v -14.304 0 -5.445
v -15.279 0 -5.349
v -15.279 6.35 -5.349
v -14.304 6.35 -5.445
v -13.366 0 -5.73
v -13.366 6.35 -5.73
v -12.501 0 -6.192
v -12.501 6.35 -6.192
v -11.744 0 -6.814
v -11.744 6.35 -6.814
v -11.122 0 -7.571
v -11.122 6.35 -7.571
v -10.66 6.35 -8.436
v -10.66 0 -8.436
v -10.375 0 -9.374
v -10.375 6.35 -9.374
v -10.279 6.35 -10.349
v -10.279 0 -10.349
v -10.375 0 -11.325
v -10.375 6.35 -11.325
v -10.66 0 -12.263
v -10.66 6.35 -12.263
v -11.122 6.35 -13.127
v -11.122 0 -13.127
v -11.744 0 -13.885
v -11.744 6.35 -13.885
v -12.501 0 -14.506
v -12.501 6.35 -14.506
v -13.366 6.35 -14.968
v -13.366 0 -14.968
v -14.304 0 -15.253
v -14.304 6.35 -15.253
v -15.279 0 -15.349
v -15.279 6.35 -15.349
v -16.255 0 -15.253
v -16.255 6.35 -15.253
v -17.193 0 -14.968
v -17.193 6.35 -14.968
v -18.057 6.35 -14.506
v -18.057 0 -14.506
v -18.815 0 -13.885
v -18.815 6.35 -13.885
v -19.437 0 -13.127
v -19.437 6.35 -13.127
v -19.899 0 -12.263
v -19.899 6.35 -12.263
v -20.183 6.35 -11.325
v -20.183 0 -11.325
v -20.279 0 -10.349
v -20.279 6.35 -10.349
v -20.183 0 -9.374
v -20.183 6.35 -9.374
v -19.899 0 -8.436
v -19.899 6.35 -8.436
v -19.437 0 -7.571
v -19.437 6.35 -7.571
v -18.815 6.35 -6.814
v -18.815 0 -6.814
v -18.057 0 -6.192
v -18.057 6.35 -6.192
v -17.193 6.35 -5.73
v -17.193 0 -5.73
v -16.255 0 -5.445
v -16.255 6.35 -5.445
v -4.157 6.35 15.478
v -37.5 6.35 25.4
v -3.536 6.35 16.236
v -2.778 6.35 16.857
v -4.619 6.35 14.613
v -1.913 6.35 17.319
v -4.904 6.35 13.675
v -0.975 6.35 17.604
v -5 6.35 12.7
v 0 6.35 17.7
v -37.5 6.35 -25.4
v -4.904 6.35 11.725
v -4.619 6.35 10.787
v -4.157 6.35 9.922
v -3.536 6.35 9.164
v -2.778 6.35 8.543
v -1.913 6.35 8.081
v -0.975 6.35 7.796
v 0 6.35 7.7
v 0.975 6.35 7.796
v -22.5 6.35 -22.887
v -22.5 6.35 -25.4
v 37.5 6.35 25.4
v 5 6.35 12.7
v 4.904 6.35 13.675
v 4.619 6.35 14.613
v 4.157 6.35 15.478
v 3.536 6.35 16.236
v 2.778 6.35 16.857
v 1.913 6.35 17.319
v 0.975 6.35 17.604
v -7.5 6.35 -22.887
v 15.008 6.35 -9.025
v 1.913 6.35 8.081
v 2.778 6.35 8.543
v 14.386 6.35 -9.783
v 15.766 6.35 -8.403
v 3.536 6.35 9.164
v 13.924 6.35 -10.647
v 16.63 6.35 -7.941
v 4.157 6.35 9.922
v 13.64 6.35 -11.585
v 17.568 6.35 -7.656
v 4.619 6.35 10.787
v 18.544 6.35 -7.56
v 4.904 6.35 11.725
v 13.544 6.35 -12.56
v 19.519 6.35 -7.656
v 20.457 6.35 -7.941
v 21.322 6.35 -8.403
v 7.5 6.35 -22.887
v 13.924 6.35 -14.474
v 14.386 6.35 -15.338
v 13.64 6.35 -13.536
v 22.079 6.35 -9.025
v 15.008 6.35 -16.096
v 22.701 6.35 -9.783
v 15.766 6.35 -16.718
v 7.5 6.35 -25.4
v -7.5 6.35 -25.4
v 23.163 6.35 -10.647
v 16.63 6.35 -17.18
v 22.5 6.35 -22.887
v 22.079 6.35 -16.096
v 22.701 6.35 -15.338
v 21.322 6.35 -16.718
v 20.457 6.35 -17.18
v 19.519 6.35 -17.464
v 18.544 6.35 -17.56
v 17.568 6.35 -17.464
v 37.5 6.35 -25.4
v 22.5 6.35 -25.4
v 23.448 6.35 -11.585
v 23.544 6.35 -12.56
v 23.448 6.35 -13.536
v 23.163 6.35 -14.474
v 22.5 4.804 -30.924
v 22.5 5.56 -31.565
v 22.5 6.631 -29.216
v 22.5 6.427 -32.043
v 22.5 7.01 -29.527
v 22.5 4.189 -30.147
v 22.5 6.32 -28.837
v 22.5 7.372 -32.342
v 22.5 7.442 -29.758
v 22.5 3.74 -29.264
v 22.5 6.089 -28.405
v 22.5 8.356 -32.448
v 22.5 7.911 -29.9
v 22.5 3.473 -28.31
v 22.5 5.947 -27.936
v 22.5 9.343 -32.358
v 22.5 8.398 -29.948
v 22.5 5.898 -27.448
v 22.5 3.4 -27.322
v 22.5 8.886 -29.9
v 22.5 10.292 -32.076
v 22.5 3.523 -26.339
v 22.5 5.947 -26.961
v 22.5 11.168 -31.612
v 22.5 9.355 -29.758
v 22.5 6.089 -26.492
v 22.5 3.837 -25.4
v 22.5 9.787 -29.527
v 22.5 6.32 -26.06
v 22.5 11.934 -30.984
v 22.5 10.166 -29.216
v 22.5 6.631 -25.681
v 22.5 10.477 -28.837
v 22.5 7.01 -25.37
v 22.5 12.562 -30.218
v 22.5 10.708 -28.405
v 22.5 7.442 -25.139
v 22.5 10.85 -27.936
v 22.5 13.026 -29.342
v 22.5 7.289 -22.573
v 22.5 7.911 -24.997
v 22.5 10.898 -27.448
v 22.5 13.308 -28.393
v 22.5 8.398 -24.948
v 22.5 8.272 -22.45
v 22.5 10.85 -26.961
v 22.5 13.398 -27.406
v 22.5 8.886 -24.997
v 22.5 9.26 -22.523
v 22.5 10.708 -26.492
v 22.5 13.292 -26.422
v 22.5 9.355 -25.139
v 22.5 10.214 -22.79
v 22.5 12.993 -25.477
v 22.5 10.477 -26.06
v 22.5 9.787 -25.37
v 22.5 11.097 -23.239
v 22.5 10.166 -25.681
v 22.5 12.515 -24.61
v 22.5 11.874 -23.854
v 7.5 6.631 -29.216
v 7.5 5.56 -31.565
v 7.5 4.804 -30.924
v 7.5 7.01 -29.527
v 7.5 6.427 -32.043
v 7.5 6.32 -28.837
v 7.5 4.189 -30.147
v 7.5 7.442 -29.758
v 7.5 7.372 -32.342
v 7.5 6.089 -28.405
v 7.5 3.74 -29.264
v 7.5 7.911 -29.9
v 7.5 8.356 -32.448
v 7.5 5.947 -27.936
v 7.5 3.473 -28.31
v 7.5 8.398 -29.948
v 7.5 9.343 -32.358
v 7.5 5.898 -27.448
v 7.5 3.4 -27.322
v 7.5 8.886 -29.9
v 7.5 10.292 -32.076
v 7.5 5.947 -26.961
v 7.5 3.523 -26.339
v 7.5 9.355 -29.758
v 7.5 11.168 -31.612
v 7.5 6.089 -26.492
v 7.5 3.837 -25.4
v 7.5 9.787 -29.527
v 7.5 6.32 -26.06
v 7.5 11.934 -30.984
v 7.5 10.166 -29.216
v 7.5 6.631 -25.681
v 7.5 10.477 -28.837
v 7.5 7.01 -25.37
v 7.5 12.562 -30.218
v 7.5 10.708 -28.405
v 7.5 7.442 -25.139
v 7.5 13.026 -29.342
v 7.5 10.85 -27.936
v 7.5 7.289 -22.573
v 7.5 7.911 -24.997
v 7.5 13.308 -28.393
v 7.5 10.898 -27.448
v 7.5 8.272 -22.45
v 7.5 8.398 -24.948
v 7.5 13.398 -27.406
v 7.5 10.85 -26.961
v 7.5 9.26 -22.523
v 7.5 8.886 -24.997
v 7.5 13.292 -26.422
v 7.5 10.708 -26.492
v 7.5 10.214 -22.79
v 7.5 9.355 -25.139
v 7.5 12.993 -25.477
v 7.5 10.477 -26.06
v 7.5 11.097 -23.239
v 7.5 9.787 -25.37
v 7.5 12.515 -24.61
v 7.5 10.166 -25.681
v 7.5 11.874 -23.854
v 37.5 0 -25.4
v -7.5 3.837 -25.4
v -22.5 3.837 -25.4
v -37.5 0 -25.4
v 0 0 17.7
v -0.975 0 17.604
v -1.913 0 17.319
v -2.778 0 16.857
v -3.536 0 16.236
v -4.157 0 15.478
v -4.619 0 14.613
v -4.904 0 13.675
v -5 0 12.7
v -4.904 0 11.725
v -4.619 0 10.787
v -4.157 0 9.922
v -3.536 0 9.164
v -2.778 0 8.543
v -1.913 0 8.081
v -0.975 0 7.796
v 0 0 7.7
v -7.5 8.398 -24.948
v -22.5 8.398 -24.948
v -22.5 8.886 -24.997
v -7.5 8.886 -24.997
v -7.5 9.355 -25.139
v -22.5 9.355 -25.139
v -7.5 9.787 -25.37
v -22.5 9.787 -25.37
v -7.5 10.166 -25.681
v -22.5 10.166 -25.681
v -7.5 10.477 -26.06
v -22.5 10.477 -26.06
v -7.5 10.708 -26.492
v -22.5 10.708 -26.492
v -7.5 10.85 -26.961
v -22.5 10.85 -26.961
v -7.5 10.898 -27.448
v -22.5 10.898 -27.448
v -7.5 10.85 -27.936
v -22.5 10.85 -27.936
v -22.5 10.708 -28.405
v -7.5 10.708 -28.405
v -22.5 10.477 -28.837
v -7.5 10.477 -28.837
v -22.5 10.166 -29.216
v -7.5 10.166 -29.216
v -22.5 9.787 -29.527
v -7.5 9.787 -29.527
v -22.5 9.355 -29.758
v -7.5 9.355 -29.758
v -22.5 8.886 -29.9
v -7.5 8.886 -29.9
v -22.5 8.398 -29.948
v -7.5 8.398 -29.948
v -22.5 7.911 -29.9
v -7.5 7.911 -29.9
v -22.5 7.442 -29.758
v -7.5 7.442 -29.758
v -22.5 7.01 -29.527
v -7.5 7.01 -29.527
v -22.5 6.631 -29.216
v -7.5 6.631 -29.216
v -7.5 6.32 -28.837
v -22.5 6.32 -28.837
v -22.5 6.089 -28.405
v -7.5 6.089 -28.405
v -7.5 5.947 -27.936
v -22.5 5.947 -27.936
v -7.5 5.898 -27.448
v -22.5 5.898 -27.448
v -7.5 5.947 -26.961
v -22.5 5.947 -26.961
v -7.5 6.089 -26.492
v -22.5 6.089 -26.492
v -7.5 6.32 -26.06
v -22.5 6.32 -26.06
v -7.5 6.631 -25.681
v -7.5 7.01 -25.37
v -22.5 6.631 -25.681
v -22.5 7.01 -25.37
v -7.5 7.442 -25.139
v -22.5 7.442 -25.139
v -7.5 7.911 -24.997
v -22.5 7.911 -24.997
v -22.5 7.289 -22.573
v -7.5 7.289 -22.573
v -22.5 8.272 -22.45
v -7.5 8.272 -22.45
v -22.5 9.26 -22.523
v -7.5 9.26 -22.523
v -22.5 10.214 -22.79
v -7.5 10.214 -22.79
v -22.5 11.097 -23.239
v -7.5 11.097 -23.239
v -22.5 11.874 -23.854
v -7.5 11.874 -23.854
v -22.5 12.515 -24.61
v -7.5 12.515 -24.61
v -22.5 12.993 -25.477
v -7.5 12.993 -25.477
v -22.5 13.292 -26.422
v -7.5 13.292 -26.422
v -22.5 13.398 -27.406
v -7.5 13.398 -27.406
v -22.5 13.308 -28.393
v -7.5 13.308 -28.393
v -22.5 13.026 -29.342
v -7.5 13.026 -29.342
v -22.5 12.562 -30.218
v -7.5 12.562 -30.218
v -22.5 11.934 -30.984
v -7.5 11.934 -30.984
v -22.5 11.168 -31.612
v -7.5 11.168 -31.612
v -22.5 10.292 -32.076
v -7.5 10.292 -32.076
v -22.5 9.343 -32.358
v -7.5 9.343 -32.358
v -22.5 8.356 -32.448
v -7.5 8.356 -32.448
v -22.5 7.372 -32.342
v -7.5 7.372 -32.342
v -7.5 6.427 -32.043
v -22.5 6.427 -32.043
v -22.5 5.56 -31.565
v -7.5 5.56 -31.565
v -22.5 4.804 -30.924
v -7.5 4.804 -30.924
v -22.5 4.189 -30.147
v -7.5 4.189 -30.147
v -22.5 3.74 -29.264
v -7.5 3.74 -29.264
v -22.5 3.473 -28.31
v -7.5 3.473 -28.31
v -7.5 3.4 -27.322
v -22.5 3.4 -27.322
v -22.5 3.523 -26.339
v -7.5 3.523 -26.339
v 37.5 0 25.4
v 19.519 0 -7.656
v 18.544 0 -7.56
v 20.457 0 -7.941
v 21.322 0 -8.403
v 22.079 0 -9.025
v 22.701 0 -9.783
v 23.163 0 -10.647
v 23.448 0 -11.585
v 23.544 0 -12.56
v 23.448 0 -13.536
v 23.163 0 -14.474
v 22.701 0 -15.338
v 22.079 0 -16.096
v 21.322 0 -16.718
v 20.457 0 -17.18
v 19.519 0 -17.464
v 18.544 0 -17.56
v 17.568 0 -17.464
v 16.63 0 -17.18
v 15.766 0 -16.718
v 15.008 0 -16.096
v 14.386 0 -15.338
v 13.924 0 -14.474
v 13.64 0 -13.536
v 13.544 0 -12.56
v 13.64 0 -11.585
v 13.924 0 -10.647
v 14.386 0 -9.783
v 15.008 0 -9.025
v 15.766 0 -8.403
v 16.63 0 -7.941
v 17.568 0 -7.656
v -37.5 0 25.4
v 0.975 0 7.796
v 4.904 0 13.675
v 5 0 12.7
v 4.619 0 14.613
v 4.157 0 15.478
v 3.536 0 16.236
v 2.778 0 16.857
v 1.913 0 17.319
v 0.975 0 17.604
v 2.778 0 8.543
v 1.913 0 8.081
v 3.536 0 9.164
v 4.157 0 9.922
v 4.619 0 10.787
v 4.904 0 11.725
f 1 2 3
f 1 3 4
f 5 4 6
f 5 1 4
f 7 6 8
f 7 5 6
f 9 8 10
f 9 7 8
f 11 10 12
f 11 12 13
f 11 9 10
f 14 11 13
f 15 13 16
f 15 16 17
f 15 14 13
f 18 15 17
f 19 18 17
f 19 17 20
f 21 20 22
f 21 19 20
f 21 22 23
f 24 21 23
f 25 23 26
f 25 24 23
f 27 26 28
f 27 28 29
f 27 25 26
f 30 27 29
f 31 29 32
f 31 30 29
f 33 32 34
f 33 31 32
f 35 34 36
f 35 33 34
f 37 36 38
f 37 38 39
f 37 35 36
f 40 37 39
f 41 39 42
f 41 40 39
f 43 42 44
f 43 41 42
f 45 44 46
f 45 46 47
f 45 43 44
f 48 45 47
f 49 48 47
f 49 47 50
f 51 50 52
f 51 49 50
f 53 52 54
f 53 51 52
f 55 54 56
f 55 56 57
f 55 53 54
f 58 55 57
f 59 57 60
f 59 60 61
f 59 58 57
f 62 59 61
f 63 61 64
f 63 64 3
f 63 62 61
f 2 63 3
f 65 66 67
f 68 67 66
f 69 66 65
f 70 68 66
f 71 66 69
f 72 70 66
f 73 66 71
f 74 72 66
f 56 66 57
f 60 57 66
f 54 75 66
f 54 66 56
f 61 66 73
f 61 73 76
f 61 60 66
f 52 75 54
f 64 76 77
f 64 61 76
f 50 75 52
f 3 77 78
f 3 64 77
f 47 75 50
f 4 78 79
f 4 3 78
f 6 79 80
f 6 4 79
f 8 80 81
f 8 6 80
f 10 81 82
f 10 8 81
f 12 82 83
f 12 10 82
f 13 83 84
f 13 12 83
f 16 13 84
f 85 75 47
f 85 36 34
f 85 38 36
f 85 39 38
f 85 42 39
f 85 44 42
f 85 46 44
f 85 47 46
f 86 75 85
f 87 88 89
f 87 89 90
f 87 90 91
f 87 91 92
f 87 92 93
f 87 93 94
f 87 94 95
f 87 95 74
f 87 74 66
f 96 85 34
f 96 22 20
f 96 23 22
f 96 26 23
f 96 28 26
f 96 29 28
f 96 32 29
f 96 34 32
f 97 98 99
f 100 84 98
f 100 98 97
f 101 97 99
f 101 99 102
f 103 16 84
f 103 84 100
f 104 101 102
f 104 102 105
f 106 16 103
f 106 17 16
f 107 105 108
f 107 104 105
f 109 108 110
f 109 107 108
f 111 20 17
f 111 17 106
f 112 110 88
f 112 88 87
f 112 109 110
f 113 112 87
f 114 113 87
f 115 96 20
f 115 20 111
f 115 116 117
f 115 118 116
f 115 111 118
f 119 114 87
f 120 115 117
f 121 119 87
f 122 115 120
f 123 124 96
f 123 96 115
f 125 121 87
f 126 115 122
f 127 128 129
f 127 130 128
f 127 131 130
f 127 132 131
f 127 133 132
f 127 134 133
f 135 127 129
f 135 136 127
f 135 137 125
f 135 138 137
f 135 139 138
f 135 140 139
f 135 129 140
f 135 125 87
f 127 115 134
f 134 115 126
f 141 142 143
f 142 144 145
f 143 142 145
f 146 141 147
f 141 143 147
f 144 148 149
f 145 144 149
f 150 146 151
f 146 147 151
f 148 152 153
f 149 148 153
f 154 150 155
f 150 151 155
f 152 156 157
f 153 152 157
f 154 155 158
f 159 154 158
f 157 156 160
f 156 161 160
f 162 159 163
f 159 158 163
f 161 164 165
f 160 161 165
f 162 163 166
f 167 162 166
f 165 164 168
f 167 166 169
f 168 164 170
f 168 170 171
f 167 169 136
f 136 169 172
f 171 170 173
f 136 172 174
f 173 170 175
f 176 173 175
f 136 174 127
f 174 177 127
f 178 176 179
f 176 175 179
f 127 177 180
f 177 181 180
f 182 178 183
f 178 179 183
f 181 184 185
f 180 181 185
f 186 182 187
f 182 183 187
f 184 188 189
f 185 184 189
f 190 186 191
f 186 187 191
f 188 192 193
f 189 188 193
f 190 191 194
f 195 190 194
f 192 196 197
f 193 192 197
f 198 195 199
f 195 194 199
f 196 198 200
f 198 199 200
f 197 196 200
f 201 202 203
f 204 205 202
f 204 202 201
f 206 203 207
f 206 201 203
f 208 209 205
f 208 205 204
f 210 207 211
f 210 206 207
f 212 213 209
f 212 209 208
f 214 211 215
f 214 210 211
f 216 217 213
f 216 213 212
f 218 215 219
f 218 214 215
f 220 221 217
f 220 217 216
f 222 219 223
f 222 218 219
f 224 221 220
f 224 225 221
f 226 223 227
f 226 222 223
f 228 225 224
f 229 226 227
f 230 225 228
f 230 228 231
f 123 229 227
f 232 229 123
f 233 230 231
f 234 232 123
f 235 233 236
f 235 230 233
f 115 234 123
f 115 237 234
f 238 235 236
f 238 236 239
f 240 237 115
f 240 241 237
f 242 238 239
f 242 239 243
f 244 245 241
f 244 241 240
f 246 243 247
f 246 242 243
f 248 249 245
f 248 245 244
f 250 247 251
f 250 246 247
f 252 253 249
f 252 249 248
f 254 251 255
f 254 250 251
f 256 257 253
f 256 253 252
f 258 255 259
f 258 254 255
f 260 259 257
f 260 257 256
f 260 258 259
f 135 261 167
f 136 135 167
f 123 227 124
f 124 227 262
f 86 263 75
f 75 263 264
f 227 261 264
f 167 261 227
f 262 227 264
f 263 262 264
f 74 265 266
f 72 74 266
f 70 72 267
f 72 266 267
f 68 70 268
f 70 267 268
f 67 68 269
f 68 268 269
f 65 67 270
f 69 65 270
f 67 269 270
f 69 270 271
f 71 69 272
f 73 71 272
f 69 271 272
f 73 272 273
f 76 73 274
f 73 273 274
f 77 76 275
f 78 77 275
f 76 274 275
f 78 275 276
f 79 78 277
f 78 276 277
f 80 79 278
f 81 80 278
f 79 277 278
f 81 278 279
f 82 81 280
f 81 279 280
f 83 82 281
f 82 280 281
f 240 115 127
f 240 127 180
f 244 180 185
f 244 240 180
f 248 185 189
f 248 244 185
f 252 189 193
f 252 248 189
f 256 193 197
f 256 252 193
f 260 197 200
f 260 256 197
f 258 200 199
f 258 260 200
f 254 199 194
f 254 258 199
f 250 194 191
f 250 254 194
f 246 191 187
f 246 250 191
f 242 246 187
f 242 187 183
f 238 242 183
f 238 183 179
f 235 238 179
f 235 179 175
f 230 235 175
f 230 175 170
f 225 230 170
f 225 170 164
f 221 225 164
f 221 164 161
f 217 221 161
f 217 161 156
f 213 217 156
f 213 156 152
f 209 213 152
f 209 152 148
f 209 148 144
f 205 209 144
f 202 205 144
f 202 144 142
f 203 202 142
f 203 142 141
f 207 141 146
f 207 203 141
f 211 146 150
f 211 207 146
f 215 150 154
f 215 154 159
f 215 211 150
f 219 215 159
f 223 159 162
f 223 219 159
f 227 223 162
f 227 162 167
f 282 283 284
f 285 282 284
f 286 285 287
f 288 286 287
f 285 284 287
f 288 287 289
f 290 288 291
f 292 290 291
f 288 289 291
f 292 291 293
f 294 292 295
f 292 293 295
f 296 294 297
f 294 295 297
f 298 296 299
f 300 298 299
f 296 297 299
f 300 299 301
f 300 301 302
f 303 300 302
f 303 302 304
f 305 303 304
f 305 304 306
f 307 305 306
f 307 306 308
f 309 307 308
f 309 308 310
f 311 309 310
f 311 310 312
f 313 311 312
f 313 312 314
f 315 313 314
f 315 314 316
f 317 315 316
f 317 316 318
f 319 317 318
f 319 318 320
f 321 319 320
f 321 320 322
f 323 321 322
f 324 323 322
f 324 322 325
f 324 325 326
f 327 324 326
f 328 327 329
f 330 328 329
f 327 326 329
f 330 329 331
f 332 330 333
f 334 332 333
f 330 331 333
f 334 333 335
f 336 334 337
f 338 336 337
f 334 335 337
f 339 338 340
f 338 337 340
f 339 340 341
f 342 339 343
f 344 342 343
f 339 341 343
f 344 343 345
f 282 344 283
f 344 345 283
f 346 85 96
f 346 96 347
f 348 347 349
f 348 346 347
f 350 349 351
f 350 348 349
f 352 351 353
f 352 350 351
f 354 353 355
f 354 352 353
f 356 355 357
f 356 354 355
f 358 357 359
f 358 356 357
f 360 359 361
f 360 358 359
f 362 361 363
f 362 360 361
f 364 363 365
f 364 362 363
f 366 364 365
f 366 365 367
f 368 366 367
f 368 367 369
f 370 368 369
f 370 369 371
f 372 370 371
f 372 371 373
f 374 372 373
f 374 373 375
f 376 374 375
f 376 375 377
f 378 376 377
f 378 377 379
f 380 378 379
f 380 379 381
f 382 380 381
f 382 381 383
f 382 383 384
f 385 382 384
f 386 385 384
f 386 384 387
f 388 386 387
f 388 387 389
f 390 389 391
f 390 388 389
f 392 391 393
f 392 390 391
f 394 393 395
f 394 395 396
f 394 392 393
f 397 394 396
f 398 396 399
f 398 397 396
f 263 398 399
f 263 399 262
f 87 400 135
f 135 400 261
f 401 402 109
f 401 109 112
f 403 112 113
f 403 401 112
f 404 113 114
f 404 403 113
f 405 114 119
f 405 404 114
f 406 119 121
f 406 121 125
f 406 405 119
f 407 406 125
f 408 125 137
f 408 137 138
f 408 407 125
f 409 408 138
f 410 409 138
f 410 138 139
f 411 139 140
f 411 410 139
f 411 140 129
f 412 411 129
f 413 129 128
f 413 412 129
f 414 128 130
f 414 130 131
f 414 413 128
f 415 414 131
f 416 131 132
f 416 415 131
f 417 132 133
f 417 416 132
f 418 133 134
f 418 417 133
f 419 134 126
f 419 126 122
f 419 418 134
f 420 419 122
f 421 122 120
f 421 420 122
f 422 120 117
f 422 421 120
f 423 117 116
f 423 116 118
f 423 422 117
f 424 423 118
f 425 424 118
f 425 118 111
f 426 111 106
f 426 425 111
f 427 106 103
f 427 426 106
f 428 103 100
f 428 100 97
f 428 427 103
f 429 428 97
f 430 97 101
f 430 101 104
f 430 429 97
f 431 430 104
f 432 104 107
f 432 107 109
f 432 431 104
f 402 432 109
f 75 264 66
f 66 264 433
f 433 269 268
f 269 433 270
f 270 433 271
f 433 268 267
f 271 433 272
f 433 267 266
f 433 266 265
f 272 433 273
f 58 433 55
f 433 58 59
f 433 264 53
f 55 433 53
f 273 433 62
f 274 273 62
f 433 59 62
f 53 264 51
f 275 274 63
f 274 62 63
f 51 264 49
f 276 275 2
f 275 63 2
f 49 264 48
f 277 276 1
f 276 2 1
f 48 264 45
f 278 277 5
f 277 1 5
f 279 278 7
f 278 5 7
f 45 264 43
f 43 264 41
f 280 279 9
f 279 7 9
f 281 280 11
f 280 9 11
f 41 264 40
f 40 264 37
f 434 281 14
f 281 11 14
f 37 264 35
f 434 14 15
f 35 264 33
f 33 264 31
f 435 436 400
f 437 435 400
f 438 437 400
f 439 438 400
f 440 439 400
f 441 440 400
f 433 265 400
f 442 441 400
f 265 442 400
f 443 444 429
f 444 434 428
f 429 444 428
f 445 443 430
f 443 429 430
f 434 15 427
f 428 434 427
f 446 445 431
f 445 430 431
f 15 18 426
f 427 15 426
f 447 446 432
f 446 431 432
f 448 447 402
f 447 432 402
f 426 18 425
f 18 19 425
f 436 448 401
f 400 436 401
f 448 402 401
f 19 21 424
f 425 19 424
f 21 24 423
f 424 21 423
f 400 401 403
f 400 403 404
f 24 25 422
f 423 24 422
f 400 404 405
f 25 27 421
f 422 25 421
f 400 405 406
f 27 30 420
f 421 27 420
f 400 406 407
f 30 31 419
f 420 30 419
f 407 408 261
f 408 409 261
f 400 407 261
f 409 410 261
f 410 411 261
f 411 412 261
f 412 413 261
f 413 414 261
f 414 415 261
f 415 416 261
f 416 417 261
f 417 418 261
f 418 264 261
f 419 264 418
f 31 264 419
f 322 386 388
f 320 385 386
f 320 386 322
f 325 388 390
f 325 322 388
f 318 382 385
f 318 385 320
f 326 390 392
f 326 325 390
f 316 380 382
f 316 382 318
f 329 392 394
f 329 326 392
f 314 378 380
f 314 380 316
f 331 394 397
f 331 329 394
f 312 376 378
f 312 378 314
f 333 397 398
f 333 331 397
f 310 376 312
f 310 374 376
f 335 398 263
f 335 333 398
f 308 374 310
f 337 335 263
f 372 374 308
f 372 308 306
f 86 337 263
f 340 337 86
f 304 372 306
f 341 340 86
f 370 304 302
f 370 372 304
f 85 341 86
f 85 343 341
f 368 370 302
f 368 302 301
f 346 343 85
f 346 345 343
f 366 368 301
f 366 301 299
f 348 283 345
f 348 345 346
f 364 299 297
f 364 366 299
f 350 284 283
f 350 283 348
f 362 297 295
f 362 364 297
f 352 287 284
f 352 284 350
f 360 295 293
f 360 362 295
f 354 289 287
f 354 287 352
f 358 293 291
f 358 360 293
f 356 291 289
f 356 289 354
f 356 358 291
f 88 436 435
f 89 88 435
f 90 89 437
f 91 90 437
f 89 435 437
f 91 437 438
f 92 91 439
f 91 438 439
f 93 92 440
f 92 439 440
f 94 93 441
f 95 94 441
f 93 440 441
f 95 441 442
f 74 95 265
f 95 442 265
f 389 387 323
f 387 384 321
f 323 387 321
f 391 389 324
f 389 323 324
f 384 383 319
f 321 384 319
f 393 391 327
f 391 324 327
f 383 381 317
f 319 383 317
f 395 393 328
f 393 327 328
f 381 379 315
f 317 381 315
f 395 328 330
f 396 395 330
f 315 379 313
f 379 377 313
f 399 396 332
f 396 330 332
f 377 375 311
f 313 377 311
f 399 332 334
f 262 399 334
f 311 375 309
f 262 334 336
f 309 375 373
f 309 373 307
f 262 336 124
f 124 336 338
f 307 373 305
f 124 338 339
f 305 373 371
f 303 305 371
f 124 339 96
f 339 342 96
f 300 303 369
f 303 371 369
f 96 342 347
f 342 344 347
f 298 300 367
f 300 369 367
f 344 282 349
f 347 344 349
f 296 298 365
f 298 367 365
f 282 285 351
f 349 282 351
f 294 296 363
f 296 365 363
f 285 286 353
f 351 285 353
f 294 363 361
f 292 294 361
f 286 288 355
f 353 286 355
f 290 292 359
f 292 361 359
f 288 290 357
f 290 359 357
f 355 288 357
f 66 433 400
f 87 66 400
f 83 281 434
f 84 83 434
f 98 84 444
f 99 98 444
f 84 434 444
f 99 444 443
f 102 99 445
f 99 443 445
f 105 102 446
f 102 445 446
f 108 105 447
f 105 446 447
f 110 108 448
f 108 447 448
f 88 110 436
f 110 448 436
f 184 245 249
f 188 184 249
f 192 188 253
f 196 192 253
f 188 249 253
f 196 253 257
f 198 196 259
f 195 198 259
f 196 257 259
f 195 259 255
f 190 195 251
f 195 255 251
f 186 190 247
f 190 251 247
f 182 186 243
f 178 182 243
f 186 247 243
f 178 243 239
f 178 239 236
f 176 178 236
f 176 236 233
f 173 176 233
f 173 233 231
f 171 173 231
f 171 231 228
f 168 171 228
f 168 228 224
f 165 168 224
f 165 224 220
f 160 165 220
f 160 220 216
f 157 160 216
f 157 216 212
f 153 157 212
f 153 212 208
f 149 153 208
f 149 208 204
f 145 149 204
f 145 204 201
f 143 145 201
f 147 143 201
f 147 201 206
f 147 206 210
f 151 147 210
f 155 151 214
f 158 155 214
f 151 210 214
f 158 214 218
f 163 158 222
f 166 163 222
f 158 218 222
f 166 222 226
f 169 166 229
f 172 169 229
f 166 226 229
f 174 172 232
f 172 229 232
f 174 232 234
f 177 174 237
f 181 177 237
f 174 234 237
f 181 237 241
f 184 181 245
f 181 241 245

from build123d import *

# Parameters (mm, degrees)
SKETCH1_W           = 75
SKETCH1_H           = 50.8
SKETCH1_R           = 5
BOSS_EXTRUDE1_DEPTH = 6.35
BOSS_EXTRUDE2_START = -15
SKETCH2_R           = 5
BOSS_EXTRUDE2_DEPTH = 15
LPATTERN1_COUNT     = 2
LPATTERN1_PITCH     = 30
SKETCH2_4_R         = 2.5
CUT_EXTRUDE2_DEPTH  = 83.80956065


with BuildPart() as part:
    # Sketch1 → Boss-Extrude1 (new body)
    with BuildSketch(Plane(origin=(0, 0, 0), x_dir=(1, 0, 0), z_dir=(0, 1, 0))):
        Rectangle(SKETCH1_W, SKETCH1_H)
        with Locations((0, -12.7)):
            Circle(SKETCH1_R, mode=Mode.SUBTRACT)
        with Locations((-15.279173033, 10.349093201)):
            Circle(SKETCH1_R, mode=Mode.SUBTRACT)
        with Locations((18.543836974, 12.56035891)):
            Circle(SKETCH1_R, mode=Mode.SUBTRACT)
    extrude(amount=BOSS_EXTRUDE1_DEPTH)

    # Sketch2 → Boss-Extrude2 (add)
    with BuildSketch(Plane.ZY.offset(37.5).offset(BOSS_EXTRUDE2_START)):
        with Locations((-27.448482339, 8.398482339)):
            Circle(SKETCH2_R)
    boss_extrude2 = extrude(amount=-BOSS_EXTRUDE2_DEPTH)

    # LPattern1: Boss-Extrude2 ×2
    with Locations(*[(i * LPATTERN1_PITCH, 0, 0) for i in range(1, LPATTERN1_COUNT)]):
        add(boss_extrude2)

    # Sketch2<4> → Cut-Extrude2 (cut, through all)
    with BuildSketch(Plane.ZY.offset(37.5)):
        with Locations((-27.448482339, 8.398482339)):
            Circle(SKETCH2_4_R)
    extrude(amount=-CUT_EXTRUDE2_DEPTH, mode=Mode.SUBTRACT)


solid = part.part
